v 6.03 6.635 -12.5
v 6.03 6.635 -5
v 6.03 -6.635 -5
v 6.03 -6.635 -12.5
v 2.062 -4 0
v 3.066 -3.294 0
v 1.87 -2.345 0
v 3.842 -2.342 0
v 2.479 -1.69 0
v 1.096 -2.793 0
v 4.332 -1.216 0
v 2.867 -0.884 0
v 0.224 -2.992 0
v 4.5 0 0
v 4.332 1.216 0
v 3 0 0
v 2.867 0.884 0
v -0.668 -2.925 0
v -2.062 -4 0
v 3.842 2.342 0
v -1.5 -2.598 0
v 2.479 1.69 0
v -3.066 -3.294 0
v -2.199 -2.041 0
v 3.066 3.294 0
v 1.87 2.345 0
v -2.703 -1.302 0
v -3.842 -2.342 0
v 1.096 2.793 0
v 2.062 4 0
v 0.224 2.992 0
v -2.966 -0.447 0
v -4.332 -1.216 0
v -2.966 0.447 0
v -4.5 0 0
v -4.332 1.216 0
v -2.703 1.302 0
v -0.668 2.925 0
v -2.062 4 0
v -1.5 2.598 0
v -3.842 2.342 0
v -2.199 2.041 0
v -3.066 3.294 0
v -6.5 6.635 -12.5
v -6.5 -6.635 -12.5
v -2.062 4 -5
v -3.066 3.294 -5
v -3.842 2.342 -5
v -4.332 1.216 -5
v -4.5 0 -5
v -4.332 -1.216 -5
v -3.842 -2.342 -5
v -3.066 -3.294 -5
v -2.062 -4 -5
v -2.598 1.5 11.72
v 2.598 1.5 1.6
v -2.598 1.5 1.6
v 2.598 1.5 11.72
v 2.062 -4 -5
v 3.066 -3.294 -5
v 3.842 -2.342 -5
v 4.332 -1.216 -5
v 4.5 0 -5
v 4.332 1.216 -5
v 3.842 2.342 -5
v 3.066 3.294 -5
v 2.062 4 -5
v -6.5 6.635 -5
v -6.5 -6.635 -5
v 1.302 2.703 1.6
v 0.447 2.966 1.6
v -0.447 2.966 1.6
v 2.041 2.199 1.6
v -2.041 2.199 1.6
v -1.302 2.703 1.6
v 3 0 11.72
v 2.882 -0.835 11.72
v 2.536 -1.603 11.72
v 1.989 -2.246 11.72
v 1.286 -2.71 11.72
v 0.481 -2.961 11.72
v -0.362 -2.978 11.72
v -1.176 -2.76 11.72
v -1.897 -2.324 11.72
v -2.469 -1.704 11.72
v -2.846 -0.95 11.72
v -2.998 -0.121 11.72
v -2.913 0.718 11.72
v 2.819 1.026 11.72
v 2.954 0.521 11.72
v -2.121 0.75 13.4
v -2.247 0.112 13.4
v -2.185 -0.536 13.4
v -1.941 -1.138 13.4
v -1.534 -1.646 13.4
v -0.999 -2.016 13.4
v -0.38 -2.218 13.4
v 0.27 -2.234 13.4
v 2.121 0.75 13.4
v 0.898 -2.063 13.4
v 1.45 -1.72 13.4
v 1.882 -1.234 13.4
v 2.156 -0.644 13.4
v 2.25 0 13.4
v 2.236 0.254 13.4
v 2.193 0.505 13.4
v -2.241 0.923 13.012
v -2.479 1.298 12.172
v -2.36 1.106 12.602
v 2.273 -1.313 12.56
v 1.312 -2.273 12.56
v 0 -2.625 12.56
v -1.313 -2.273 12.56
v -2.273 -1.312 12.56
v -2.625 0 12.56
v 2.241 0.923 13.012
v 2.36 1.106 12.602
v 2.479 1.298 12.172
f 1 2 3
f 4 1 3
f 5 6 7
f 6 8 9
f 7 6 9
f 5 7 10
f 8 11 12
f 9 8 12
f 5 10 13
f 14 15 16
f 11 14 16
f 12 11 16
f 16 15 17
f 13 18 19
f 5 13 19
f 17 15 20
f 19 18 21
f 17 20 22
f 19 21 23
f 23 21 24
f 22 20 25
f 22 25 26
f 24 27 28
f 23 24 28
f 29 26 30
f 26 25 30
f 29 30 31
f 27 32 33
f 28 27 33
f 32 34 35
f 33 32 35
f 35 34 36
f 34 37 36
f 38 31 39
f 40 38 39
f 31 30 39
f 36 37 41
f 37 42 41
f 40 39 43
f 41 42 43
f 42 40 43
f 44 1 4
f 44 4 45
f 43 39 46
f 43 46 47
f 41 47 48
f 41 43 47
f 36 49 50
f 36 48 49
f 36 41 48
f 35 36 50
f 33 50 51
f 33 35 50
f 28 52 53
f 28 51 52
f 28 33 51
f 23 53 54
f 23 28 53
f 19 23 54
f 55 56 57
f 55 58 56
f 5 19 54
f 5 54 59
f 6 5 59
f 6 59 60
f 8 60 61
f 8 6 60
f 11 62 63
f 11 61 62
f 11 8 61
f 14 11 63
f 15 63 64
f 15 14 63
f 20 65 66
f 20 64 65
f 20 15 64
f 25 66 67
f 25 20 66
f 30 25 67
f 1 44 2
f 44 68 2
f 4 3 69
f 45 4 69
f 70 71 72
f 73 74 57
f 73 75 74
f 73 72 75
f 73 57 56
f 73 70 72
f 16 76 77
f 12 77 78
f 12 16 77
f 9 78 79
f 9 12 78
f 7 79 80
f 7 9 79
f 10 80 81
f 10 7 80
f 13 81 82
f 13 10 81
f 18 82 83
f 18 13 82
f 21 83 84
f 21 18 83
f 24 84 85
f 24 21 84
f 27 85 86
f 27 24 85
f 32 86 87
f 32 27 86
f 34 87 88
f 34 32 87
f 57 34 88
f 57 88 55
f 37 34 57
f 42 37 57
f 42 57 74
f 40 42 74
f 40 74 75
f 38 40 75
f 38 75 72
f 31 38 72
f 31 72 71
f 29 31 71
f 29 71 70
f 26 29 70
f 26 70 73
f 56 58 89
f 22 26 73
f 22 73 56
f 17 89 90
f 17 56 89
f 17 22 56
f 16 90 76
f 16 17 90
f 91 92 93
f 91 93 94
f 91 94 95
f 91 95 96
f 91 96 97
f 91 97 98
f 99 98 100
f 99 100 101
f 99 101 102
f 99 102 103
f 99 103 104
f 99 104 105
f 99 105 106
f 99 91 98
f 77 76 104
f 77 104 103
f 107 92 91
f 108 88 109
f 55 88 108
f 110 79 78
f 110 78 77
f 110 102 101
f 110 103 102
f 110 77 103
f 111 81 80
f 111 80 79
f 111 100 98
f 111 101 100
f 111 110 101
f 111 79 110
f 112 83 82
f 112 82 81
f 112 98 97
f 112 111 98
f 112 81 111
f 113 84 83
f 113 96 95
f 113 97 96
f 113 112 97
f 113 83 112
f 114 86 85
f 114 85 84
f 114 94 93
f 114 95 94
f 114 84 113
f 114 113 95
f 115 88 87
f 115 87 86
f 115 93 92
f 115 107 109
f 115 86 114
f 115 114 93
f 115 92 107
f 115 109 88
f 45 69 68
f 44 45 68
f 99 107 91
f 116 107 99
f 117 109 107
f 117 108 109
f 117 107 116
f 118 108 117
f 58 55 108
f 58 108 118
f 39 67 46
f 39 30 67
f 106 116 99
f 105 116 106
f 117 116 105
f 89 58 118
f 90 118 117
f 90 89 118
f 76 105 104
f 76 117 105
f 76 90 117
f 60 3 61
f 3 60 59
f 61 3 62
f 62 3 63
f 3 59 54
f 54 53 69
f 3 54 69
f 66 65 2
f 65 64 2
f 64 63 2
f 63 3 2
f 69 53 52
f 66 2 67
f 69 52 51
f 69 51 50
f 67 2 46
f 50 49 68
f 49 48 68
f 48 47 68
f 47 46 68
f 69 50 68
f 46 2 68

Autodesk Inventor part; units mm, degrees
ref_plane "YZ Plane" through (0, 0, 0) normal (1, 0, 0) x (0, 1, 0)
ref_plane "XZ Plane" through (0, 0, 0) normal (0, 1, 0) x (-1, 0, 0)
ref_plane "XY Plane" through (0, 0, 0) normal (0, 0, 1) x (1, 0, 0)
sketch "Esquisse1" plane through (0, 0, 0) normal (0, 0, 1) x (1, 0, 0)
  circle A0 centre (0, 0) radius 3
  dimension "d0" = 6
extrude "Extrusion1" add sketch "Esquisse1" along normal blind 13.4
sketch "Esquisse2" plane through (0, 0, 13.4) normal (0, 0, 1) x (1, 0, 0)
  line L0 (-3, 3) -> (3, 3)
  line L1 (3, 3) -> (3, 1.5)
  line L2 (3, 1.5) -> (-3, 1.5)
  line L3 (-3, 1.5) -> (-3, 3)
  circle A0 centre (0, 0) radius 3 projected
  dimension "d3" = 1.5
extrude "Extrusion2" cut sketch "Esquisse2" against normal blind 11.8 contours L0 A0 L2 L3 | L0 L1 L2 A0 | A0 L2 picked at (-0.7431, 1.6691)
sketch "Esquisse4" plane through (0, 0, 0) normal (0, 0, -1) x (-1, 0, 0)
  line L0 (-2.0616, 4) -> (2.0616, 4)
  line L1 (2.0616, -4) -> (-2.0616, -4)
  line L2 (0, -6.3) -> (0, 6.3) construction
  line L3 (6.3, 0) -> (-6.3, 0) construction
  arc A0 (2.0616, -4) -> (2.0616, 4) centre (0, 0) ccw
  arc A1 (-2.0616, 4) -> (-2.0616, -4) centre (0, 0) ccw
  dimension "d12" = 8
  dimension "d40" = 4.5
extrude "Extrusion4" add sketch "Esquisse4" along normal blind 5
sketch "Esquisse5" plane through (0, 0, -5) normal (0, 0, -1) x (-1, 0, 0)
  line L0 (6.5, 6.635) -> (-6.03, 6.635)
  line L1 (-6.03, 6.635) -> (-6.03, -6.635)
  line L2 (-6.03, -6.635) -> (6.5, -6.635)
  line L3 (6.5, -6.635) -> (6.5, 6.635)
  line L4 (9.006, 0) -> (-8.536, 0) construction
  line L5 (0, -9.289) -> (0, 9.289) construction
  point P0 (0, 0)
  dimension "d24" = 12.53
  dimension "d25" = 6.5
  dimension "d26" = 13.27
extrude "Extrusion5" add sketch "Esquisse5" along normal blind 7.5
chamfer "Chanfrein1" distance 0.75 distance2 1.68 1 edges at (0, 1.5, 13.4) measured on face at (-0.5642, -0.3597, 13.4)
chamfer "Chanfrein2" distance 0.75 distance2 1.68 2 edges at (2.9761, 0.378, 13.4) (-0.378, -2.9761, 13.4) measured on face at (-0.5788, -0.7991, 13.4)
thread "Filetage5" size "M3x0.5" class "6g" standard "ISO M" full length
thread "Filetage6" size "M3x0.5" class "6g" standard "ISO M" full length
properties part number "Potentiomètre"
